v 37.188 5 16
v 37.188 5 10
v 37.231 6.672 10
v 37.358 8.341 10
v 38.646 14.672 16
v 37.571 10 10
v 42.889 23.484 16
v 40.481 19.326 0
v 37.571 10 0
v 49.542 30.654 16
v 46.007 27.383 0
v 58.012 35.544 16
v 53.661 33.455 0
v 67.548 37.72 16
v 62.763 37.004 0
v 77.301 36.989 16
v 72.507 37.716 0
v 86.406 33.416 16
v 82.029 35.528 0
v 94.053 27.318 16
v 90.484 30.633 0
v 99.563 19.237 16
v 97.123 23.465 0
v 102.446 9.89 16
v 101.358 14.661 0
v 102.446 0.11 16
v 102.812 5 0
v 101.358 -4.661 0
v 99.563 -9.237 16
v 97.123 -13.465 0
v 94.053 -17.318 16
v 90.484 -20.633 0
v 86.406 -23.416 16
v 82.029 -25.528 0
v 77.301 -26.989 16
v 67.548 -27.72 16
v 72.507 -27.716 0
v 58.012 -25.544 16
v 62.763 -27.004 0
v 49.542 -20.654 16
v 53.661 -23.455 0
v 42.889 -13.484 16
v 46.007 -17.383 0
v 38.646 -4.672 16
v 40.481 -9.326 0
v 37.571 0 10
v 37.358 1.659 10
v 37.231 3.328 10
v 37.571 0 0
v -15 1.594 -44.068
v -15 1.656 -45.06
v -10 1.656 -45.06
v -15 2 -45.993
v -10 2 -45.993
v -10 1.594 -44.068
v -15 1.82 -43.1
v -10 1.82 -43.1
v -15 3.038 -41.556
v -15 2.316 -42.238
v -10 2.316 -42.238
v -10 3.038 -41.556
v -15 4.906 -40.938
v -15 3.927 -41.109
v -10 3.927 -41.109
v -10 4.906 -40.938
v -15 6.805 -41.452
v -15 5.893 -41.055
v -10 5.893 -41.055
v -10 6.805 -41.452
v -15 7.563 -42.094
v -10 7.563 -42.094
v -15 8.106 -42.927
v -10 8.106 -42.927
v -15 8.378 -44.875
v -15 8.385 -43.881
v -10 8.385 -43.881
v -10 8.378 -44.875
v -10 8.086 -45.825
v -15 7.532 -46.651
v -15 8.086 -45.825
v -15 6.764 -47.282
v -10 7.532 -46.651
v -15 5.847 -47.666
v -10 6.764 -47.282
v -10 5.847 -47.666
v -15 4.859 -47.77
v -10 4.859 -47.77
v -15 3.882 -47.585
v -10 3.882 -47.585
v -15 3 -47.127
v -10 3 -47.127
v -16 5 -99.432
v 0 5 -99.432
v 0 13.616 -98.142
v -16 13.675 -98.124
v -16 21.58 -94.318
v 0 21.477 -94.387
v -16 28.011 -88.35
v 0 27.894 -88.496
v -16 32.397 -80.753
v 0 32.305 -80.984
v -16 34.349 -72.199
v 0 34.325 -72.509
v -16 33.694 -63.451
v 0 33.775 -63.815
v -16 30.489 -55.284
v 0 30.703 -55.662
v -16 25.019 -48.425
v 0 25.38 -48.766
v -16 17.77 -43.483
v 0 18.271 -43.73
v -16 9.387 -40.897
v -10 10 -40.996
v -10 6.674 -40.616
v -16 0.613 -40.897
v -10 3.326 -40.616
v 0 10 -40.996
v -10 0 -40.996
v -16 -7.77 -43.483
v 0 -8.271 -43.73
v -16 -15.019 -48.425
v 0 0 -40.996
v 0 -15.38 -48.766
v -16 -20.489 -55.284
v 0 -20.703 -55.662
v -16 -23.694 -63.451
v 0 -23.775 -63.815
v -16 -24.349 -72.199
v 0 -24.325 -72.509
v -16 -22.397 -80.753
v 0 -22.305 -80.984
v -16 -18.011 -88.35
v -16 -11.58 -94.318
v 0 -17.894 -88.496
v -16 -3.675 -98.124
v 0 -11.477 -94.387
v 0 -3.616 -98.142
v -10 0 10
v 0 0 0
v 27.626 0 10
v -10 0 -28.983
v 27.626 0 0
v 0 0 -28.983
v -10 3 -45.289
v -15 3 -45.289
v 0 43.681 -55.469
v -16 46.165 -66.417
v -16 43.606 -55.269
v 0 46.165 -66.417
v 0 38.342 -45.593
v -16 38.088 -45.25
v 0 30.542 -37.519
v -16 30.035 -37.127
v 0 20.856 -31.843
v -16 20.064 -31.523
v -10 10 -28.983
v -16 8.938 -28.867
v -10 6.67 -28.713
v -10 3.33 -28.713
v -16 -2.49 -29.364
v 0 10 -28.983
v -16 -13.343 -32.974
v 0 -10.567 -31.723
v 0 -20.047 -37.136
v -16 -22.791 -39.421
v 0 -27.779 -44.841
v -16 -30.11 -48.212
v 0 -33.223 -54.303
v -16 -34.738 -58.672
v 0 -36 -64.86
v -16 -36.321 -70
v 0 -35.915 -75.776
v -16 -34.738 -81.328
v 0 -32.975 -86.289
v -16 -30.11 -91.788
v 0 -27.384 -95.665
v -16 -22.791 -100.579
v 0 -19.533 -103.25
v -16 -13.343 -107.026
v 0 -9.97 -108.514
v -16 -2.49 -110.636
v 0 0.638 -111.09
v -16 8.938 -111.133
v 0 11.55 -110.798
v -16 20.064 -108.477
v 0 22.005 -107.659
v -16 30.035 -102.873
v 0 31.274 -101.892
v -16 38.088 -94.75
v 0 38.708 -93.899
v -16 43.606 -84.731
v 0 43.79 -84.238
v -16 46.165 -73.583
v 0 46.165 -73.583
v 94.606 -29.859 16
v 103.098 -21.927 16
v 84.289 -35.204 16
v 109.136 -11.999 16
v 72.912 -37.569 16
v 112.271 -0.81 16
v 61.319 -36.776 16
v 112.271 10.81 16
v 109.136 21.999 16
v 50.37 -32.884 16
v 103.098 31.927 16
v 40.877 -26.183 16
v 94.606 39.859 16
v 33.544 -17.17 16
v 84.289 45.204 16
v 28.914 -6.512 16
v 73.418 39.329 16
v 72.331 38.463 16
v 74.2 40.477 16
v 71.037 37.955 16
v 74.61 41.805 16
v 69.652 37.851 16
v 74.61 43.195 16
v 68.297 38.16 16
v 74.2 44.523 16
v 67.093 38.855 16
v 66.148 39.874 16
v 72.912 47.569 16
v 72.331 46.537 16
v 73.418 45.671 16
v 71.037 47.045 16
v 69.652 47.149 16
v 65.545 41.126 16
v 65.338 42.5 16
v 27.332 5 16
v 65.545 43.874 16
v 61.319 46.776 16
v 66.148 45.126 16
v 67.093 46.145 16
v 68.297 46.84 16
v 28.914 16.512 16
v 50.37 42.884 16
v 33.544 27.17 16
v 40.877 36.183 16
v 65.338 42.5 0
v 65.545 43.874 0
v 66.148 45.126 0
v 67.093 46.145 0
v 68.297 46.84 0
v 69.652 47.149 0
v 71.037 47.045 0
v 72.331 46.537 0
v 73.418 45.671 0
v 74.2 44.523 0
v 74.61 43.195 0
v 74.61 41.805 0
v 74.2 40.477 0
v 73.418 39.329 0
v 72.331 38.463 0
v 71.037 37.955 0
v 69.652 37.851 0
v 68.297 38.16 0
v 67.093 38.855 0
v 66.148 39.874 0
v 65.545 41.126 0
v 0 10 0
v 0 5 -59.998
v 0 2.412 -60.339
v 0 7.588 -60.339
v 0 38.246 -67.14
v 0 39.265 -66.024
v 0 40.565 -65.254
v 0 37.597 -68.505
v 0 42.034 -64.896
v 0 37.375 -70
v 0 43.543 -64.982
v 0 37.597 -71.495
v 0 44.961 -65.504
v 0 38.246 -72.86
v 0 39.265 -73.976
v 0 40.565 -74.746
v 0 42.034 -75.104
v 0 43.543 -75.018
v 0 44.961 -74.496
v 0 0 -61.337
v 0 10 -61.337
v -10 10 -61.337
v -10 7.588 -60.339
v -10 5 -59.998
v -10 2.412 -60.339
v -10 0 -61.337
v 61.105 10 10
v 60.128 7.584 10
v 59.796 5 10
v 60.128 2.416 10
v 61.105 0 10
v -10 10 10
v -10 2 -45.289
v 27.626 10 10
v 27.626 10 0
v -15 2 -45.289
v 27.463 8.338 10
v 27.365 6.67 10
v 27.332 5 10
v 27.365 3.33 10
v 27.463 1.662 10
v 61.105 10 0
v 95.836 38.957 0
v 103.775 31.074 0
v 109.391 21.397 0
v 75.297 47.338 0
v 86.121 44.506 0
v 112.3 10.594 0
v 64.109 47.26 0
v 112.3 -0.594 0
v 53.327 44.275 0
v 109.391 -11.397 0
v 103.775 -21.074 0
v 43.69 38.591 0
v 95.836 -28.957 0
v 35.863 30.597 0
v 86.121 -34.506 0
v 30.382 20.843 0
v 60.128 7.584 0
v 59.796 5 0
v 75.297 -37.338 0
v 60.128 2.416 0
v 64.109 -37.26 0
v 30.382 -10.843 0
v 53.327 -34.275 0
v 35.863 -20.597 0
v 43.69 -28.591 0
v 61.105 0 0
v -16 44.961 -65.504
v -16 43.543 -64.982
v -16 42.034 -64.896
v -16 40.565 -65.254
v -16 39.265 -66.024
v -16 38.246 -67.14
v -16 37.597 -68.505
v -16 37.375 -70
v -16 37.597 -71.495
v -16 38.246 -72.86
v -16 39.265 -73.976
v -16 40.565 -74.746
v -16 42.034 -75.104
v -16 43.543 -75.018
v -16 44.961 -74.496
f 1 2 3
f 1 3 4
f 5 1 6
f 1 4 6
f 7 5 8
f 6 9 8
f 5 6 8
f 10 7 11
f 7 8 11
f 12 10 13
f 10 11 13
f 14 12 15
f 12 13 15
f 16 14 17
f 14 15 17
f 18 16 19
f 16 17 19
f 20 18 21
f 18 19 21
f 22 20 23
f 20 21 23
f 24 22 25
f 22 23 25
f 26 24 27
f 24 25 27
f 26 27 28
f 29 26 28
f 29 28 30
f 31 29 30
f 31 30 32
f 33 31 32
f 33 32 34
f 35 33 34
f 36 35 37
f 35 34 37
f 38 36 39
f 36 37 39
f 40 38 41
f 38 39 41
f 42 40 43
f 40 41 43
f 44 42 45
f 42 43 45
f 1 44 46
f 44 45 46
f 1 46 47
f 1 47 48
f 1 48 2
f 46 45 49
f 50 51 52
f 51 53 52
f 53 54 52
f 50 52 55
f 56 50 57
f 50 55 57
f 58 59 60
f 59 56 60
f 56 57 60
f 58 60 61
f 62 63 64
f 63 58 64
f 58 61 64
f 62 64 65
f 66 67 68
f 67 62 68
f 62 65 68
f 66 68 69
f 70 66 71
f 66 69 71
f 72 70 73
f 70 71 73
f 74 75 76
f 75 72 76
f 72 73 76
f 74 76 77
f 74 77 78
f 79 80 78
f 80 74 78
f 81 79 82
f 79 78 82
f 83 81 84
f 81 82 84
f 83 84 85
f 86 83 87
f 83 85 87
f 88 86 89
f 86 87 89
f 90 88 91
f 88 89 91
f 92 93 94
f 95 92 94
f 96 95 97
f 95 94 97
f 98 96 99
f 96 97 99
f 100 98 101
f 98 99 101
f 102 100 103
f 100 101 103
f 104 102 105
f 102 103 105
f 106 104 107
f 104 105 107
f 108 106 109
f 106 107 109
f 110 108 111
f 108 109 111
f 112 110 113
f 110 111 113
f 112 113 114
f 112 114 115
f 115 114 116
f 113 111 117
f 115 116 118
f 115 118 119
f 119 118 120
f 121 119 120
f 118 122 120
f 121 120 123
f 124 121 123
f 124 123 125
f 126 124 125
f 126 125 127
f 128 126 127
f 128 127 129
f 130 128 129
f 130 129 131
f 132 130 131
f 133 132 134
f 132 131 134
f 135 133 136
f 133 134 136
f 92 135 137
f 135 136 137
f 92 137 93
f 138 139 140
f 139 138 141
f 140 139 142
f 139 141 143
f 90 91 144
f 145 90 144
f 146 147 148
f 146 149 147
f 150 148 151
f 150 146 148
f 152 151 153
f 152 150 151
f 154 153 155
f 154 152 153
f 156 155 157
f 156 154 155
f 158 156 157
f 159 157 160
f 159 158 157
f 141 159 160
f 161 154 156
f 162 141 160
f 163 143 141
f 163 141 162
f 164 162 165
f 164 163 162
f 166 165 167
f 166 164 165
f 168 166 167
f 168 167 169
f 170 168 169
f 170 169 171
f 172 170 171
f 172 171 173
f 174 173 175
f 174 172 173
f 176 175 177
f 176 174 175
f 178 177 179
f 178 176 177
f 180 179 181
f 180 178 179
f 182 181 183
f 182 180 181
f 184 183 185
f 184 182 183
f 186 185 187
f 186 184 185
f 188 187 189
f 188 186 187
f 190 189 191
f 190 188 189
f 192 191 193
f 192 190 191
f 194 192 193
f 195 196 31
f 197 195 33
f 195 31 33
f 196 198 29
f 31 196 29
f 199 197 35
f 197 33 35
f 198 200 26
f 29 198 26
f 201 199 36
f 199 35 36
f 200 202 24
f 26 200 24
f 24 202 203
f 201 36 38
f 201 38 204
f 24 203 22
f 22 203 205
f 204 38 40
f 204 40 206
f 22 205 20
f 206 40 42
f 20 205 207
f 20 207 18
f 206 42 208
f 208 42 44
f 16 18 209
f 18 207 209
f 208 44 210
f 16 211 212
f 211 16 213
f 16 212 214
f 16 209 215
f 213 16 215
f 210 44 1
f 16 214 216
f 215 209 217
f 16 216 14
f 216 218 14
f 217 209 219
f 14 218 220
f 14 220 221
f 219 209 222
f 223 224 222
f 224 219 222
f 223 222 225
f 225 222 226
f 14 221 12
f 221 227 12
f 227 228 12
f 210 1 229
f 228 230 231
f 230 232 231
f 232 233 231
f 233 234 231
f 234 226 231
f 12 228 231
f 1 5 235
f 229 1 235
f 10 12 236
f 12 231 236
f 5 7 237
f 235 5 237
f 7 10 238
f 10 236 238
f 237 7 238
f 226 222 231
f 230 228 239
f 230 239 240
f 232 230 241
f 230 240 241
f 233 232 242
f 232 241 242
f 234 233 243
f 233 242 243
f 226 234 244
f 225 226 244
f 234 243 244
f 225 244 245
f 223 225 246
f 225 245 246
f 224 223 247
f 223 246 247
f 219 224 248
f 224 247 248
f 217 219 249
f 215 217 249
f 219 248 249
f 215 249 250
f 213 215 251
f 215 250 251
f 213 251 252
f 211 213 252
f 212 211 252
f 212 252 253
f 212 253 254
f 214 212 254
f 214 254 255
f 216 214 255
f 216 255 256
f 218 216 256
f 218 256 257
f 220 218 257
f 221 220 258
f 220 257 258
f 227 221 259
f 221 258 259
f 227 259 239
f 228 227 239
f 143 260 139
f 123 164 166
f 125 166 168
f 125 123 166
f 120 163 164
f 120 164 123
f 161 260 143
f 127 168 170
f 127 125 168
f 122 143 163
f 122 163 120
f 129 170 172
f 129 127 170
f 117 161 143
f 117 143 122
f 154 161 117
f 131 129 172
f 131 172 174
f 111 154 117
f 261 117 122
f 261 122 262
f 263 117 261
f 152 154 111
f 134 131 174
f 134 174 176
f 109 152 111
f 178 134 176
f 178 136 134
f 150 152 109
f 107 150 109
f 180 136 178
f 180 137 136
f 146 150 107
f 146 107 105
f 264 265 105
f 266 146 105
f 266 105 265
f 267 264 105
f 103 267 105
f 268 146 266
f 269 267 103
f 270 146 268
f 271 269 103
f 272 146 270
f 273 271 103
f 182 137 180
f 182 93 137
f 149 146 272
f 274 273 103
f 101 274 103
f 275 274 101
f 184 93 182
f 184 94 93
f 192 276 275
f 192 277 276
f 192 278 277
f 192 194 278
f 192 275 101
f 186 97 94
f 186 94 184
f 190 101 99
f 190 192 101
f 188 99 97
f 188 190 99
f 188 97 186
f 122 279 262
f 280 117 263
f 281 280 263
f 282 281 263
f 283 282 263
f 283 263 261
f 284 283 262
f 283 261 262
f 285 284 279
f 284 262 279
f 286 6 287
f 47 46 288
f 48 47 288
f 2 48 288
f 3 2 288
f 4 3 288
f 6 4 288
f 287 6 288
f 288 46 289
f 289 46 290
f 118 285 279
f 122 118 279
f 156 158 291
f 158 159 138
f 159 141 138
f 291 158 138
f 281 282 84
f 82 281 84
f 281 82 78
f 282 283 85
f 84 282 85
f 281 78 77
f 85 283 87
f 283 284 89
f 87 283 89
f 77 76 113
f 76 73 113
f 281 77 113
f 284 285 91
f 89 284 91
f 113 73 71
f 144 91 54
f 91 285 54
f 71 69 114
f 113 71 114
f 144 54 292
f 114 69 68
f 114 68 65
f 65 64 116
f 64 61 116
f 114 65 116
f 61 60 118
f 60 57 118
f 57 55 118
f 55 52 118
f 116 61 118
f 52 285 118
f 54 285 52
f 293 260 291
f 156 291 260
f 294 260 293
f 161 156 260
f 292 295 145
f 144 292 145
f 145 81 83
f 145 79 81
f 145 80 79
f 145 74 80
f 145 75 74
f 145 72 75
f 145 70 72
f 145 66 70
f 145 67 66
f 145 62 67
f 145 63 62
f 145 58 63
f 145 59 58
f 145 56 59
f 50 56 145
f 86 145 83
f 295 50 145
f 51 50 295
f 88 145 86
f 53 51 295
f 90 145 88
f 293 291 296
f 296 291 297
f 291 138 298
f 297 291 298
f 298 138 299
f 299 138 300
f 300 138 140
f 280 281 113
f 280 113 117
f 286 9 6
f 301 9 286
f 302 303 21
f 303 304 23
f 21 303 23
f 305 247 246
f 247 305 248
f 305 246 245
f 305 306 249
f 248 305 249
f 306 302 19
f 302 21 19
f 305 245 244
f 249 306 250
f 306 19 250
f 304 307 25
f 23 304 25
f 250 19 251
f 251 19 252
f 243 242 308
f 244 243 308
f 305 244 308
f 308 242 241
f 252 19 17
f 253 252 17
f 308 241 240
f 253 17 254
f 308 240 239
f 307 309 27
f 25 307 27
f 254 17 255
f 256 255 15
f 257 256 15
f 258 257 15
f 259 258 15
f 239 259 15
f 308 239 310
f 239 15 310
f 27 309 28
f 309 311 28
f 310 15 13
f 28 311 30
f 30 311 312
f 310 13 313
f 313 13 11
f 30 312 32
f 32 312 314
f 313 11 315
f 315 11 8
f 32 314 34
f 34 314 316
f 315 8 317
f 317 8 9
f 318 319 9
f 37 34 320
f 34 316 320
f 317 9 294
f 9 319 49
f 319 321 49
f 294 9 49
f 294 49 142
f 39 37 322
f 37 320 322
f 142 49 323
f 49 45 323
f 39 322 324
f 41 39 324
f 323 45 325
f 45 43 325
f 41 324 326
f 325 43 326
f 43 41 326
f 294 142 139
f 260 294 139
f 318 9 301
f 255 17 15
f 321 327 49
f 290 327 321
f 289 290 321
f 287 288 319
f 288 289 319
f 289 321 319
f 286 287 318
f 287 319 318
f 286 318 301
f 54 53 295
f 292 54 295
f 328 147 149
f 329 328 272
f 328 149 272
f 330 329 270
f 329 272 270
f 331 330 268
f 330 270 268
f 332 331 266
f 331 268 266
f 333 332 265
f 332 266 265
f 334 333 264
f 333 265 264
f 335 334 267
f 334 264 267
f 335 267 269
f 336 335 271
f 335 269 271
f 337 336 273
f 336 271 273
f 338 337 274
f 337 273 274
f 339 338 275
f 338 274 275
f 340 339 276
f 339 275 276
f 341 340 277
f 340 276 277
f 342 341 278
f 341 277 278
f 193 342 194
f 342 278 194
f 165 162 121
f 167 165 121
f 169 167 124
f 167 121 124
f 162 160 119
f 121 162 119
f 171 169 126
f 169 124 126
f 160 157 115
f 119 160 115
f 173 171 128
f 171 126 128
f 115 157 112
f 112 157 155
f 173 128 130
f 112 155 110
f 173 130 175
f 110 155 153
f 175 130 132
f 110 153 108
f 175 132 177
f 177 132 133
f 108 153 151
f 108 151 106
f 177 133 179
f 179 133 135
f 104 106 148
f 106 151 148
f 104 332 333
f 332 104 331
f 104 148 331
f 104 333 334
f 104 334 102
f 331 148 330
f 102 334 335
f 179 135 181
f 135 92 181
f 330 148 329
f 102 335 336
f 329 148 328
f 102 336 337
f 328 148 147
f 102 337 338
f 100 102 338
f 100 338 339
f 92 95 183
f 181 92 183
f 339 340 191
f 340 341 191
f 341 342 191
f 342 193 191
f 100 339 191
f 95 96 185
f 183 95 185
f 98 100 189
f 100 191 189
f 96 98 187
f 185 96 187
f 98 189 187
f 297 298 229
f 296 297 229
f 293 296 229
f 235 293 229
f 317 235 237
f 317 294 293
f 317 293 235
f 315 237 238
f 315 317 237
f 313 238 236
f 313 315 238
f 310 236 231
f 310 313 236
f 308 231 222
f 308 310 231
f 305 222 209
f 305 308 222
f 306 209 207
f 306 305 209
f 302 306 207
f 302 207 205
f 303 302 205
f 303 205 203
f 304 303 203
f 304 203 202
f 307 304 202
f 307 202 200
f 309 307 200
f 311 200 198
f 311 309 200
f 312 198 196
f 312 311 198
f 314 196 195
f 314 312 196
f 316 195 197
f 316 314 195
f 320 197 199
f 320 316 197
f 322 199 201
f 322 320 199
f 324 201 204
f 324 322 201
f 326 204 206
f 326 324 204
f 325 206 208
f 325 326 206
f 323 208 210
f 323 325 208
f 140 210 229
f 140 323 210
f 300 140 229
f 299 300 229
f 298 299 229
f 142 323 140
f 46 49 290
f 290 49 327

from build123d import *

# Parameters (mm, degrees)
BOSS_EXTRUDE1_DEPTH = 10
SKETCH3_R           = 5
BOSS_EXTRUDE2_DEPTH = 5
SKETCH4_W           = 12.842437823
SKETCH4_H           = 1
CUT_EXTRUDE1_DEPTH  = 5
SKETCH5_R           = 3.418084762
BOSS_EXTRUDE3_DEPTH = 5
SKETCH6_W           = 9.346993936
SKETCH6_H           = 1
CUT_EXTRUDE2_DEPTH  = 5
SKETCH7_R           = 42.668113091
SKETCH7_R_2         = 32.812087574
BOSS_EXTRUDE4_DEPTH = 16
SKETCH8_R           = 10.204262611
CUT_EXTRUDE3_DEPTH  = 16
SKETCH9_R           = 41.320841223
SKETCH9_R_2         = 29.431774833
BOSS_EXTRUDE5_DEPTH = 16
SKETCH10_R          = 10.002103031
CUT_EXTRUDE4_DEPTH  = 16
SKETCH11_R          = 5.125485485
CUT_EXTRUDE5_DEPTH  = 16
SKETCH12_R          = 4.662079799
CUT_EXTRUDE6_DEPTH  = 16


with BuildPart() as part:
    # Sketch1 → Boss-Extrude1 (new body)
    with BuildSketch(Plane(origin=(0, 0, 0), x_dir=(1, 0, 0), z_dir=(0, 1, 0))):
        Polygon((0, 0), (0, 70), (-10, 70), (-10, -10), (70, -10), (70, 0), align=None)
    extrude(amount=BOSS_EXTRUDE1_DEPTH)

    # Sketch3 → Boss-Extrude2 (add)
    with BuildSketch(Plane.XY.offset(10)):
        with Locations((65, 5)):
            Circle(SKETCH3_R)
    extrude(amount=BOSS_EXTRUDE2_DEPTH)

    # Sketch4 → Cut-Extrude1 (cut)
    with BuildSketch(Plane.XY.offset(15)):
        with Locations((61.851491479, 5)):
            Rectangle(SKETCH4_W, SKETCH4_H)
    extrude(amount=-CUT_EXTRUDE1_DEPTH, mode=Mode.SUBTRACT)

    # Sketch5 → Boss-Extrude3 (add)
    with BuildSketch(Plane.ZY.offset(10)):
        with Locations(Location((-44.354632579, 5, 0), (0, 0, 180))):
            Circle(SKETCH5_R)
    extrude(amount=BOSS_EXTRUDE3_DEPTH)

    # Sketch6 → Cut-Extrude2 (cut)
    with BuildSketch(Plane.ZY.offset(15)):
        with Locations((-49.962828941, 2.5)):
            Rectangle(SKETCH6_W, SKETCH6_H)
    extrude(amount=-CUT_EXTRUDE2_DEPTH, mode=Mode.SUBTRACT)

    # Sketch7 → Boss-Extrude4 (add)
    with BuildSketch(Plane(origin=(0, 0, 0), x_dir=(-1, 0, 0), z_dir=(0, 0, -1))):
        with Locations((-70, 5)):
            Circle(SKETCH7_R)
        with Locations((-70, 5)):
            Circle(SKETCH7_R_2, mode=Mode.SUBTRACT)
    extrude(amount=-BOSS_EXTRUDE4_DEPTH)

    # Sketch8 → Cut-Extrude3 (cut)
    with BuildSketch(Plane(origin=(0, 0, 0), x_dir=(-1, 0, 0), z_dir=(0, 0, -1))):
        with Locations((-70, 5)):
            Circle(SKETCH8_R)
    extrude(amount=-CUT_EXTRUDE3_DEPTH, mode=Mode.SUBTRACT)

    # Sketch9 → Boss-Extrude5 (add)
    with BuildSketch(Plane(origin=(0, 0, 0), x_dir=(0, 0, -1), z_dir=(1, 0, 0))):
        with Locations((70, 5)):
            Circle(SKETCH9_R)
        with Locations((70, 5)):
            Circle(SKETCH9_R_2, mode=Mode.SUBTRACT)
    extrude(amount=-BOSS_EXTRUDE5_DEPTH)

    # Sketch10 → Cut-Extrude4 (cut)
    with BuildSketch(Plane(origin=(0, 0, 0), x_dir=(0, 0, -1), z_dir=(1, 0, 0))):
        with Locations((70, 5)):
            Circle(SKETCH10_R)
    extrude(amount=-CUT_EXTRUDE4_DEPTH, mode=Mode.SUBTRACT)

    # Sketch11 → Cut-Extrude5 (cut)
    with BuildSketch(Plane(origin=(0, 0, 0), x_dir=(0, 0, -1), z_dir=(1, 0, 0))):
        with Locations((70, 42.5)):
            Circle(SKETCH11_R)
    extrude(amount=-CUT_EXTRUDE5_DEPTH, mode=Mode.SUBTRACT)

    # Sketch12 → Cut-Extrude6 (cut)
    with BuildSketch(Plane(origin=(0, 0, 0), x_dir=(-1, 0, 0), z_dir=(0, 0, -1))):
        with Locations((-70, 42.5)):
            Circle(SKETCH12_R)
    extrude(amount=-CUT_EXTRUDE6_DEPTH, mode=Mode.SUBTRACT)


solid = part.part
